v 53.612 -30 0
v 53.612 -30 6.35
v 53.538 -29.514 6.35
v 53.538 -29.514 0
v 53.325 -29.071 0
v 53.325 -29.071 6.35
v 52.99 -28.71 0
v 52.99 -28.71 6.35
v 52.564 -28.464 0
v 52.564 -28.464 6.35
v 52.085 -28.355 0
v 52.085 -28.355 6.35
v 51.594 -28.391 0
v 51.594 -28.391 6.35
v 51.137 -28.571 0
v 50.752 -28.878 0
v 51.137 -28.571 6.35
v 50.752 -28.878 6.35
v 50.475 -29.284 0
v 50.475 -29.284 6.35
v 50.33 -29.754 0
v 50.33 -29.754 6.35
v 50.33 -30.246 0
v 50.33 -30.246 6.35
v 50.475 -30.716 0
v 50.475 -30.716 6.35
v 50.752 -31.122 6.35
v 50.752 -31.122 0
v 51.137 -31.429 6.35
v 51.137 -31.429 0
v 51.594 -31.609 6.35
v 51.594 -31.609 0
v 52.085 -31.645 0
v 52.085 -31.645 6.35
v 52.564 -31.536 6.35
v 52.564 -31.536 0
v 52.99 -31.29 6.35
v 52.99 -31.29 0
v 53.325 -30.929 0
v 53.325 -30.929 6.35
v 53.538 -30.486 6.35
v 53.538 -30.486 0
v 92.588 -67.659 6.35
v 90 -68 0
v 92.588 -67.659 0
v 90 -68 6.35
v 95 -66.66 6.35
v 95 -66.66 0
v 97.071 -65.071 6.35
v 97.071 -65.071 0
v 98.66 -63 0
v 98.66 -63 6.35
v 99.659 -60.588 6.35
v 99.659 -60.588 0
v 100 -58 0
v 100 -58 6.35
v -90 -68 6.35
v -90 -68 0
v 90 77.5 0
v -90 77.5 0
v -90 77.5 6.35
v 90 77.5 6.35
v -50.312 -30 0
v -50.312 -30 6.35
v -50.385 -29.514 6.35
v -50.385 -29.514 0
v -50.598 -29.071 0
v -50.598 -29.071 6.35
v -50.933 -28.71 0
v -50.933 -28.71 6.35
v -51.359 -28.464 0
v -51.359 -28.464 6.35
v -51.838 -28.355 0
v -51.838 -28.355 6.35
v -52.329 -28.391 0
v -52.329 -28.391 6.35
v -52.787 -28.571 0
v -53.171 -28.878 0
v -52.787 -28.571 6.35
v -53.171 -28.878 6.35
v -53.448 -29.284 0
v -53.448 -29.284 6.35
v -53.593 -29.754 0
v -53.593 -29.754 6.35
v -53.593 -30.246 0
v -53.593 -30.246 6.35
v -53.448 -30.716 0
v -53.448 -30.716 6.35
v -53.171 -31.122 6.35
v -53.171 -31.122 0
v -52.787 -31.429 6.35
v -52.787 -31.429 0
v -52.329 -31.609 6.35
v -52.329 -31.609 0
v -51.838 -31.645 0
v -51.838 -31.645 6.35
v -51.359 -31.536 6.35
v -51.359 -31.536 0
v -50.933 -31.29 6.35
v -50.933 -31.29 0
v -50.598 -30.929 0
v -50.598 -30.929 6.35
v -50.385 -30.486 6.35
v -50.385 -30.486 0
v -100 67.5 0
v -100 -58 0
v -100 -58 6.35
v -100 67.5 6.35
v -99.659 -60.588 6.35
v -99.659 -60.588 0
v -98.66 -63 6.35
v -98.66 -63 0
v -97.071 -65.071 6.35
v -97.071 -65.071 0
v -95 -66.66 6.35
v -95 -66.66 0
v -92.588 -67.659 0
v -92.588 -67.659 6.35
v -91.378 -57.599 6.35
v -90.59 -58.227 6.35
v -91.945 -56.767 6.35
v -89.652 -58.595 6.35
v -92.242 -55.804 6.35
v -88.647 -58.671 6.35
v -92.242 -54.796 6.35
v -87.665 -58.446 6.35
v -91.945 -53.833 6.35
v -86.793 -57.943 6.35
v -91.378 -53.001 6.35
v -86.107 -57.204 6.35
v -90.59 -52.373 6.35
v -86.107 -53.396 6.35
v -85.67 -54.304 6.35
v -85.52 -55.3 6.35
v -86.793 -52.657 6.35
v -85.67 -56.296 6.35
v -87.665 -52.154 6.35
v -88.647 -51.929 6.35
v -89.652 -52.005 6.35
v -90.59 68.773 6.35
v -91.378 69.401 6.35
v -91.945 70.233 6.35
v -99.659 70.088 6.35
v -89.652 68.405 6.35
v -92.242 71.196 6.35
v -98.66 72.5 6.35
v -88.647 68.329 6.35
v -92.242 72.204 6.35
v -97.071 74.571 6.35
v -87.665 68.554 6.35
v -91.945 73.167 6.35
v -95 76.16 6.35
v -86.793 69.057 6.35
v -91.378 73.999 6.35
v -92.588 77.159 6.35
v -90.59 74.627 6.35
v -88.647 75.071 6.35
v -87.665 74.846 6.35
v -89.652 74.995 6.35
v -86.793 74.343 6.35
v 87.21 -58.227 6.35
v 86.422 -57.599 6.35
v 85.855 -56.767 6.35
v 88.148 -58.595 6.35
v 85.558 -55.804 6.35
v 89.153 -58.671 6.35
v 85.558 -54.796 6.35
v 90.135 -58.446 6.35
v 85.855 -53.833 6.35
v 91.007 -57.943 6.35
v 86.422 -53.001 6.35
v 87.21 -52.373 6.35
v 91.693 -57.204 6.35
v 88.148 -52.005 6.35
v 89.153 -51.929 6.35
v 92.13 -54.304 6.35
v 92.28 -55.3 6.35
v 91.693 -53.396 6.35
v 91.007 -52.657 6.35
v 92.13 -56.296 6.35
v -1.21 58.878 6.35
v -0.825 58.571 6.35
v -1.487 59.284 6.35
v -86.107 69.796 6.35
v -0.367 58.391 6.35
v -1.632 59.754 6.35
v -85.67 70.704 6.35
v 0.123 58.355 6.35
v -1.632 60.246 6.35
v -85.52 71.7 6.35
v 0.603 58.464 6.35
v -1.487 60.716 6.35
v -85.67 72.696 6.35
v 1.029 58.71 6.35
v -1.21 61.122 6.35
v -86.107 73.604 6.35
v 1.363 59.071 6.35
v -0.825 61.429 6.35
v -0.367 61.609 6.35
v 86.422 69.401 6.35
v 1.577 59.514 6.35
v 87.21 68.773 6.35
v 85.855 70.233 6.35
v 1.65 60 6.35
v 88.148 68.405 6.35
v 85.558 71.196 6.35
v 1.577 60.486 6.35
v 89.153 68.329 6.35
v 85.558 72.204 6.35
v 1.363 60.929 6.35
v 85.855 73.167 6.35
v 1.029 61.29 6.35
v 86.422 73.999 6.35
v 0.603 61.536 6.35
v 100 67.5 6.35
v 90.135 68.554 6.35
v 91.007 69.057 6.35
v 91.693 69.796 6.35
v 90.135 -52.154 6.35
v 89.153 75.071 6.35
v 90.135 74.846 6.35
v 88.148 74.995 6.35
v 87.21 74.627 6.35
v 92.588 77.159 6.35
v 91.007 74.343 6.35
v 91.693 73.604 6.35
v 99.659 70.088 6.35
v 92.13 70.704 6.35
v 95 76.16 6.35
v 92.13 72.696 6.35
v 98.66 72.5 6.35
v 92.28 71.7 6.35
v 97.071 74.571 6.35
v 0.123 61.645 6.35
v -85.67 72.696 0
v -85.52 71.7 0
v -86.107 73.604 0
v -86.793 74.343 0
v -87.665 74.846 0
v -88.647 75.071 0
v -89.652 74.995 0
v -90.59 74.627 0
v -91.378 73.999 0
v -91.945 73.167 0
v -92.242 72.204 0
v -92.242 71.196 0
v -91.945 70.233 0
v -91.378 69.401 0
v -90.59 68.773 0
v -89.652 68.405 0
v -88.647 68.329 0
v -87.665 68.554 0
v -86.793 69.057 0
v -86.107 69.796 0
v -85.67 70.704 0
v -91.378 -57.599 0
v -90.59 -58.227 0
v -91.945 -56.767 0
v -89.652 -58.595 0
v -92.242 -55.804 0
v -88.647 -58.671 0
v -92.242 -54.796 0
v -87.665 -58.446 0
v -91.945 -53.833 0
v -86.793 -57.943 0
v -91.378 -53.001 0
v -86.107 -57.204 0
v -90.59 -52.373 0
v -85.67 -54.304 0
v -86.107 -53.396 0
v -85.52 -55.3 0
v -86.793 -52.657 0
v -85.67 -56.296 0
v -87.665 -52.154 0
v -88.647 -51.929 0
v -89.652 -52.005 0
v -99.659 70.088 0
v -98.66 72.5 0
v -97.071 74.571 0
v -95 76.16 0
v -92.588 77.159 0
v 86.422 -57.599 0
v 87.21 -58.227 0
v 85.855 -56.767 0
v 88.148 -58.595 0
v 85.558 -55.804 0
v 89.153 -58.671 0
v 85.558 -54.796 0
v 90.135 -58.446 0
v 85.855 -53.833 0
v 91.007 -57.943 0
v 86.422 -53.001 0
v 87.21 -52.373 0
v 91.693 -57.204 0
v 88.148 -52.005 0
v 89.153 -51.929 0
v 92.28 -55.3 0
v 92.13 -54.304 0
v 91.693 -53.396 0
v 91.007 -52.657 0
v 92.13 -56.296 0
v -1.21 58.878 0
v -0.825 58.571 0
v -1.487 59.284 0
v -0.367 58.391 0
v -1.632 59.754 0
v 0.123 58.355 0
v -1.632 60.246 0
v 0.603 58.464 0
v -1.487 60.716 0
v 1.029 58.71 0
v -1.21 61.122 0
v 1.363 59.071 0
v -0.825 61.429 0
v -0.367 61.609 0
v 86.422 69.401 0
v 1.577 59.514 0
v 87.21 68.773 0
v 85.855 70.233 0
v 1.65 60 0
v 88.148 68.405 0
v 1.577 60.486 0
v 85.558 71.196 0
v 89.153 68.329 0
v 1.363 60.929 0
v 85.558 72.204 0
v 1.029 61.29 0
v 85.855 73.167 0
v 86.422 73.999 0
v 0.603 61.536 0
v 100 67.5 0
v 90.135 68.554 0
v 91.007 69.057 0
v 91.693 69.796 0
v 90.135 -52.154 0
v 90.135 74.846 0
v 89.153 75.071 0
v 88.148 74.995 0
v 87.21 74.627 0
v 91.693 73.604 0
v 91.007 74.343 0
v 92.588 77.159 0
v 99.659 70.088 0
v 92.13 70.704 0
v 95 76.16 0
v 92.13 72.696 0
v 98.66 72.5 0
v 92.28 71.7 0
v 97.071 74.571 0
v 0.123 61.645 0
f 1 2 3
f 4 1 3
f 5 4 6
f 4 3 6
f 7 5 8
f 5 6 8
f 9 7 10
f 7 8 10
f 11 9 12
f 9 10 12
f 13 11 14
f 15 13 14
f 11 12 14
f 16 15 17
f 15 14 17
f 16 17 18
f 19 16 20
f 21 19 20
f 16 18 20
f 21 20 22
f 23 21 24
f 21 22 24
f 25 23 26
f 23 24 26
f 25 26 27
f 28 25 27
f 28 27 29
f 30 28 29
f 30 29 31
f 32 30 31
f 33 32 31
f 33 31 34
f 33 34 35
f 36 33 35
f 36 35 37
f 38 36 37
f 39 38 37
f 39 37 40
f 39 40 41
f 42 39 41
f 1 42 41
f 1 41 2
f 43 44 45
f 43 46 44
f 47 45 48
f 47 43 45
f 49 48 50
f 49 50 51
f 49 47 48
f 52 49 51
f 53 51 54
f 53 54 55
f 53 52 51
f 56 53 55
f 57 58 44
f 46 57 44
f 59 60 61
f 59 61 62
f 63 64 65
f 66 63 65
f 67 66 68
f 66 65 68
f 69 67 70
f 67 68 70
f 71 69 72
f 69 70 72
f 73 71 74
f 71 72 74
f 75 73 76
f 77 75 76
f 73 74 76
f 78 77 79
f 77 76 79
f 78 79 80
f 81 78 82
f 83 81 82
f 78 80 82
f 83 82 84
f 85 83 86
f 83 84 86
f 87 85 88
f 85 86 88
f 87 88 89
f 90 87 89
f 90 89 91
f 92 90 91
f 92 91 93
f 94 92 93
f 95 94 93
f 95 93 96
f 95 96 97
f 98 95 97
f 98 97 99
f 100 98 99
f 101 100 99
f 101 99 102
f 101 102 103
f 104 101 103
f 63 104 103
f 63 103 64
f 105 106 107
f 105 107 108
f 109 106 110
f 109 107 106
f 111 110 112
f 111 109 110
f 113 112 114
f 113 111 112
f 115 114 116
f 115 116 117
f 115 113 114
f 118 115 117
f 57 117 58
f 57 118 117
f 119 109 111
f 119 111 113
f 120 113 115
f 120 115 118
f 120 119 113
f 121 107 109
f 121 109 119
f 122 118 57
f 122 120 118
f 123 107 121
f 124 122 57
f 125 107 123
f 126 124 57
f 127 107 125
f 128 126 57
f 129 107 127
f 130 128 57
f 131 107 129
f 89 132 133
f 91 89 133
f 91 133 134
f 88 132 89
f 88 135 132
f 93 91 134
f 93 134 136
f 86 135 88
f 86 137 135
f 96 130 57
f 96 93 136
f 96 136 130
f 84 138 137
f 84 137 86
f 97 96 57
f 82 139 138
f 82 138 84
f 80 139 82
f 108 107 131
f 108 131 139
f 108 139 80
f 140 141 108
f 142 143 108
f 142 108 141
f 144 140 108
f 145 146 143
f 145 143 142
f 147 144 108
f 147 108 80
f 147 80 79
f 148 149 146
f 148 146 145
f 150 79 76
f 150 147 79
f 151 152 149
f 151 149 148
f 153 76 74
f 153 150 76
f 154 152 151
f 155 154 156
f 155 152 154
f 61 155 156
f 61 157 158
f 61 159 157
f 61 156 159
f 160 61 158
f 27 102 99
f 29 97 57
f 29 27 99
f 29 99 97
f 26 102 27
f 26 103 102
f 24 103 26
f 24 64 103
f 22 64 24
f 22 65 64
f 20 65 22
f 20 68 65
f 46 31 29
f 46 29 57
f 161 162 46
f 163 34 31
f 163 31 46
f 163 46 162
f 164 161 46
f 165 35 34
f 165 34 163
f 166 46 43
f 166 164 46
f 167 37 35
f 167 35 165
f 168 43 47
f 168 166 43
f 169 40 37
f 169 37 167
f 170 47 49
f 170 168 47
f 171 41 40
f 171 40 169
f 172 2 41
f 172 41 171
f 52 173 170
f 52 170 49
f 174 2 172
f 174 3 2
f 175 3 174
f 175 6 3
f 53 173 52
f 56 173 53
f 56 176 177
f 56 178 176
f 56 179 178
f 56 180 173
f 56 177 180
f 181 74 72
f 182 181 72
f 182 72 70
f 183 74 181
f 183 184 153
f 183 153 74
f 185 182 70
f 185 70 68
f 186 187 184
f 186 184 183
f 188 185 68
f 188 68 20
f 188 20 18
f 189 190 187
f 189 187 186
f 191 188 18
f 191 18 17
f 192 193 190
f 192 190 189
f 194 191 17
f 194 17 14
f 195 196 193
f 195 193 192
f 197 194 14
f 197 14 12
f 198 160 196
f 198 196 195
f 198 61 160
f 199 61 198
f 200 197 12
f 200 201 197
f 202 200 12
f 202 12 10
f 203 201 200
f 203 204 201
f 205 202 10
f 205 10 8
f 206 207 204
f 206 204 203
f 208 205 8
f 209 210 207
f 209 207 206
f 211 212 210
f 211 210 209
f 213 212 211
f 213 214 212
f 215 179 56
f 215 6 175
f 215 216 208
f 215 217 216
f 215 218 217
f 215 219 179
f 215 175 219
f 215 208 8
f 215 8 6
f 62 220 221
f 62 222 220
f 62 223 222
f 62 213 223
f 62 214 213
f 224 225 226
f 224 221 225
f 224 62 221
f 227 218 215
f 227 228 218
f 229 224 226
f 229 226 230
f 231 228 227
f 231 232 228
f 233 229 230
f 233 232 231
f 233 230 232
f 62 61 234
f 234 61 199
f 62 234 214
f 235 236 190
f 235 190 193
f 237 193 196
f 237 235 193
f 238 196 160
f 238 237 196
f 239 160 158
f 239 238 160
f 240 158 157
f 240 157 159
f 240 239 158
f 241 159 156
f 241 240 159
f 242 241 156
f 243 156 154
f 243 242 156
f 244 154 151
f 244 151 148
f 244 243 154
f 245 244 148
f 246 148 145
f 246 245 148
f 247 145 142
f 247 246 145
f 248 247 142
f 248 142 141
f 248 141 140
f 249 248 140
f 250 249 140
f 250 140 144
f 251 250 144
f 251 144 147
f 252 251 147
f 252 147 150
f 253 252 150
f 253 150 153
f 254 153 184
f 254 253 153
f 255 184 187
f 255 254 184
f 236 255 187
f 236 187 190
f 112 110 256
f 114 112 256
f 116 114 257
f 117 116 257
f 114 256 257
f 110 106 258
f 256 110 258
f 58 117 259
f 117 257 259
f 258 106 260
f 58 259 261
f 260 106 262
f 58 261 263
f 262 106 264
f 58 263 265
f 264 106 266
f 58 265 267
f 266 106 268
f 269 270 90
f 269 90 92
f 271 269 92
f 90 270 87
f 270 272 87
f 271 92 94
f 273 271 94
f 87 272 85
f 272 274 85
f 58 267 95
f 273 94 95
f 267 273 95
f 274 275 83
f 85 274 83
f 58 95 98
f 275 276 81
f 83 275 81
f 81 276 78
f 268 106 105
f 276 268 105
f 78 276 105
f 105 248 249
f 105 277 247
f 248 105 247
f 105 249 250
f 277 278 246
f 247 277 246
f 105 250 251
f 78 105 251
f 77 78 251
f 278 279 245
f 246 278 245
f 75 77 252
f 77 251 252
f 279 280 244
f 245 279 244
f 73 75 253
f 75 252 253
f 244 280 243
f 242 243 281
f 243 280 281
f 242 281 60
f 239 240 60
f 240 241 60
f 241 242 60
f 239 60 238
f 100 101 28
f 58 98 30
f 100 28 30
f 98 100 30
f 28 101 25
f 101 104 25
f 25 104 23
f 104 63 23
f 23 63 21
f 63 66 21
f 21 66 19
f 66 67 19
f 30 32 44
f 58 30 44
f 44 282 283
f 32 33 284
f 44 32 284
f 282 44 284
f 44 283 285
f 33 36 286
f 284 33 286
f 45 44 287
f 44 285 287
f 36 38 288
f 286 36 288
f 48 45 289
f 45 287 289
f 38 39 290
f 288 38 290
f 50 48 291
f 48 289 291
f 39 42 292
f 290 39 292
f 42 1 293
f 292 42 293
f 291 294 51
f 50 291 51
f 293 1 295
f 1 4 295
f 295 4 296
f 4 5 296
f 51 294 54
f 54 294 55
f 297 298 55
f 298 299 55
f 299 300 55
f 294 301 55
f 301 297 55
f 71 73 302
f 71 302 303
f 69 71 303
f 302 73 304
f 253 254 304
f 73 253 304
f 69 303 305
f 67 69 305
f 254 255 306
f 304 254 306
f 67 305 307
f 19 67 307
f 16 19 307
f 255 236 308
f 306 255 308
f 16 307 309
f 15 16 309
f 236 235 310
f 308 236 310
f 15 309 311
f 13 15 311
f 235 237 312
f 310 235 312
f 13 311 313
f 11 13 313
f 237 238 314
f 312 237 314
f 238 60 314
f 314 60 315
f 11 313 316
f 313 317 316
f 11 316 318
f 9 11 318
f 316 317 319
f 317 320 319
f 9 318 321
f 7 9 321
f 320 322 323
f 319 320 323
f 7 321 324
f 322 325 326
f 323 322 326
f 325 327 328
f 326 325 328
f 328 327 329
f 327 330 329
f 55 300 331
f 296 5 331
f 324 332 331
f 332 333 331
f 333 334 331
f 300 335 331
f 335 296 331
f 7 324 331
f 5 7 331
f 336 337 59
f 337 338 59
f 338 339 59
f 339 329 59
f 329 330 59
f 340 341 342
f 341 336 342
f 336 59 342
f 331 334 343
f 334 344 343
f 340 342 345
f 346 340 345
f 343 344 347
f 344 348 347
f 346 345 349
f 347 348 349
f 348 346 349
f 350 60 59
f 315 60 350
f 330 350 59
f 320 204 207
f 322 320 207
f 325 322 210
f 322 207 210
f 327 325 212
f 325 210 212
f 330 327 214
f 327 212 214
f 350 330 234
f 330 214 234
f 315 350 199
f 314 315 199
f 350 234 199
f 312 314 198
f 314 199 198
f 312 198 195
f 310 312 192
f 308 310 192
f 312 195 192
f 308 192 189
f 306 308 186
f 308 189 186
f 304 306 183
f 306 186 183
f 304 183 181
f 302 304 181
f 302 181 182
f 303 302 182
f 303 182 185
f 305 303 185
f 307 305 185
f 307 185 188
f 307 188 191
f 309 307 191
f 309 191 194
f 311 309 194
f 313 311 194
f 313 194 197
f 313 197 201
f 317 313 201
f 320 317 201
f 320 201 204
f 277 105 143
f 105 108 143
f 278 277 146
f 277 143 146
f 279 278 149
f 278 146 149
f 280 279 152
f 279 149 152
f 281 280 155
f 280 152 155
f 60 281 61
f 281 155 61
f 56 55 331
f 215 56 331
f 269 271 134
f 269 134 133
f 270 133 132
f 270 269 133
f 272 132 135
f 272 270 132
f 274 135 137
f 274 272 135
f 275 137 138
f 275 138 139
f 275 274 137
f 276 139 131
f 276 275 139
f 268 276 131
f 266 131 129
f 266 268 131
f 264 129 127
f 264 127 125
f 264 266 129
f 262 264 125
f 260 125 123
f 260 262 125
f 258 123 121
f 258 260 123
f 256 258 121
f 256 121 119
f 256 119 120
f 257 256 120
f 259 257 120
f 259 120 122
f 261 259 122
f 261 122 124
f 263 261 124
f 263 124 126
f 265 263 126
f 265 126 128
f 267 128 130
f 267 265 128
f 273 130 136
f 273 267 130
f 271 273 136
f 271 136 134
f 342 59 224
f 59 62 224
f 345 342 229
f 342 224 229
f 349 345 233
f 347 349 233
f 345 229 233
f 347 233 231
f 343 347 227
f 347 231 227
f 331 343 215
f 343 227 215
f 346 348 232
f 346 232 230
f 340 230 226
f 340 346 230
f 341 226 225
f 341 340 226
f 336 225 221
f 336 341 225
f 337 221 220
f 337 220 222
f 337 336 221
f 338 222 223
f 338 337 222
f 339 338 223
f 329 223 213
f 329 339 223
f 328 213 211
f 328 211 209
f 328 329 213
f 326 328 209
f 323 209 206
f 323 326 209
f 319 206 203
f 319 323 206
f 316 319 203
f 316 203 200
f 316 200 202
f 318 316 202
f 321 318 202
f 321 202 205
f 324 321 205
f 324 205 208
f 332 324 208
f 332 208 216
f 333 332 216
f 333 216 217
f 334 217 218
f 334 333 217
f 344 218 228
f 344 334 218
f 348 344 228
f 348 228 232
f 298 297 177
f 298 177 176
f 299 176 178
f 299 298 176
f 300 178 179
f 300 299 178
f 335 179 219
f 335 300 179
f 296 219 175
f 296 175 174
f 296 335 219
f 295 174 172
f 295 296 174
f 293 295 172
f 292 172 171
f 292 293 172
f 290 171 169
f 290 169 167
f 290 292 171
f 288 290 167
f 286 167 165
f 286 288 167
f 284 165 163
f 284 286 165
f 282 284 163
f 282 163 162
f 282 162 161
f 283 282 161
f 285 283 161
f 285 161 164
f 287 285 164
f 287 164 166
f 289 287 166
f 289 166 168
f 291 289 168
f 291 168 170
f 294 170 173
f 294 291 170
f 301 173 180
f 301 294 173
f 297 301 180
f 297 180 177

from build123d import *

# Parameters (mm, degrees)
SKETCH1_W               = 200
SKETCH1_H               = 155
SKETCH1_R               = 3.38
BOSS_EXTRUDE1_DEPTH     = 6.35
M4X0_7_TAPPED_HOLE1_D   = 3.3
CUT_EXTRUDE1_DEPTH      = 127.675066607
CUT_EXTRUDE1_DEPTH_BACK = 127.675066607
SKETCH4_W               = 200
SKETCH4_H               = 9.5
FILLET1_R               = 10


with BuildPart() as part:
    # Sketch1 → Boss-Extrude1 (new body)
    with BuildSketch(Plane.XY):
        Rectangle(SKETCH1_W, SKETCH1_H)
        with Locations((-88.9, 71.7)):
            Circle(SKETCH1_R, mode=Mode.SUBTRACT)
        with Locations((88.9, 71.7)):
            Circle(SKETCH1_R, mode=Mode.SUBTRACT)
        with Locations((88.9, -55.3)):
            Circle(SKETCH1_R, mode=Mode.SUBTRACT)
        with Locations((-88.9, -55.3)):
            Circle(SKETCH1_R, mode=Mode.SUBTRACT)
    extrude(amount=BOSS_EXTRUDE1_DEPTH)

    # M4x0.7 Tapped Hole1 (through all)
    with Locations(Plane(origin=(51.961524227, -30, 0), x_dir=(-1, 0, 0), z_dir=(0, 0, -1))):
        with Locations((0, 0), (103.923048454, 0), (51.961524227, 90)):
            Hole(M4X0_7_TAPPED_HOLE1_D / 2)

    # Sketch4 → Cut-Extrude1 (cut, two sides: drawn at the far end of the back side and taken through both)
    with BuildSketch(Plane.XY.offset(6.35).offset(-CUT_EXTRUDE1_DEPTH_BACK)):
        with Locations((0, -72.75)):
            Rectangle(SKETCH4_W, SKETCH4_H)
    extrude(amount=CUT_EXTRUDE1_DEPTH + CUT_EXTRUDE1_DEPTH_BACK, mode=Mode.SUBTRACT)

    # Fillet1
    fillet1_edges = [part.edges().sort_by_distance(p)[0] for p in [
        (-100, -68, 3.175),
        (100, -68, 3.175),
        (-100, 77.5, 3.175),
        (100, 77.5, 3.175),
    ]]
    fillet(fillet1_edges, radius=FILLET1_R)


solid = part.part
